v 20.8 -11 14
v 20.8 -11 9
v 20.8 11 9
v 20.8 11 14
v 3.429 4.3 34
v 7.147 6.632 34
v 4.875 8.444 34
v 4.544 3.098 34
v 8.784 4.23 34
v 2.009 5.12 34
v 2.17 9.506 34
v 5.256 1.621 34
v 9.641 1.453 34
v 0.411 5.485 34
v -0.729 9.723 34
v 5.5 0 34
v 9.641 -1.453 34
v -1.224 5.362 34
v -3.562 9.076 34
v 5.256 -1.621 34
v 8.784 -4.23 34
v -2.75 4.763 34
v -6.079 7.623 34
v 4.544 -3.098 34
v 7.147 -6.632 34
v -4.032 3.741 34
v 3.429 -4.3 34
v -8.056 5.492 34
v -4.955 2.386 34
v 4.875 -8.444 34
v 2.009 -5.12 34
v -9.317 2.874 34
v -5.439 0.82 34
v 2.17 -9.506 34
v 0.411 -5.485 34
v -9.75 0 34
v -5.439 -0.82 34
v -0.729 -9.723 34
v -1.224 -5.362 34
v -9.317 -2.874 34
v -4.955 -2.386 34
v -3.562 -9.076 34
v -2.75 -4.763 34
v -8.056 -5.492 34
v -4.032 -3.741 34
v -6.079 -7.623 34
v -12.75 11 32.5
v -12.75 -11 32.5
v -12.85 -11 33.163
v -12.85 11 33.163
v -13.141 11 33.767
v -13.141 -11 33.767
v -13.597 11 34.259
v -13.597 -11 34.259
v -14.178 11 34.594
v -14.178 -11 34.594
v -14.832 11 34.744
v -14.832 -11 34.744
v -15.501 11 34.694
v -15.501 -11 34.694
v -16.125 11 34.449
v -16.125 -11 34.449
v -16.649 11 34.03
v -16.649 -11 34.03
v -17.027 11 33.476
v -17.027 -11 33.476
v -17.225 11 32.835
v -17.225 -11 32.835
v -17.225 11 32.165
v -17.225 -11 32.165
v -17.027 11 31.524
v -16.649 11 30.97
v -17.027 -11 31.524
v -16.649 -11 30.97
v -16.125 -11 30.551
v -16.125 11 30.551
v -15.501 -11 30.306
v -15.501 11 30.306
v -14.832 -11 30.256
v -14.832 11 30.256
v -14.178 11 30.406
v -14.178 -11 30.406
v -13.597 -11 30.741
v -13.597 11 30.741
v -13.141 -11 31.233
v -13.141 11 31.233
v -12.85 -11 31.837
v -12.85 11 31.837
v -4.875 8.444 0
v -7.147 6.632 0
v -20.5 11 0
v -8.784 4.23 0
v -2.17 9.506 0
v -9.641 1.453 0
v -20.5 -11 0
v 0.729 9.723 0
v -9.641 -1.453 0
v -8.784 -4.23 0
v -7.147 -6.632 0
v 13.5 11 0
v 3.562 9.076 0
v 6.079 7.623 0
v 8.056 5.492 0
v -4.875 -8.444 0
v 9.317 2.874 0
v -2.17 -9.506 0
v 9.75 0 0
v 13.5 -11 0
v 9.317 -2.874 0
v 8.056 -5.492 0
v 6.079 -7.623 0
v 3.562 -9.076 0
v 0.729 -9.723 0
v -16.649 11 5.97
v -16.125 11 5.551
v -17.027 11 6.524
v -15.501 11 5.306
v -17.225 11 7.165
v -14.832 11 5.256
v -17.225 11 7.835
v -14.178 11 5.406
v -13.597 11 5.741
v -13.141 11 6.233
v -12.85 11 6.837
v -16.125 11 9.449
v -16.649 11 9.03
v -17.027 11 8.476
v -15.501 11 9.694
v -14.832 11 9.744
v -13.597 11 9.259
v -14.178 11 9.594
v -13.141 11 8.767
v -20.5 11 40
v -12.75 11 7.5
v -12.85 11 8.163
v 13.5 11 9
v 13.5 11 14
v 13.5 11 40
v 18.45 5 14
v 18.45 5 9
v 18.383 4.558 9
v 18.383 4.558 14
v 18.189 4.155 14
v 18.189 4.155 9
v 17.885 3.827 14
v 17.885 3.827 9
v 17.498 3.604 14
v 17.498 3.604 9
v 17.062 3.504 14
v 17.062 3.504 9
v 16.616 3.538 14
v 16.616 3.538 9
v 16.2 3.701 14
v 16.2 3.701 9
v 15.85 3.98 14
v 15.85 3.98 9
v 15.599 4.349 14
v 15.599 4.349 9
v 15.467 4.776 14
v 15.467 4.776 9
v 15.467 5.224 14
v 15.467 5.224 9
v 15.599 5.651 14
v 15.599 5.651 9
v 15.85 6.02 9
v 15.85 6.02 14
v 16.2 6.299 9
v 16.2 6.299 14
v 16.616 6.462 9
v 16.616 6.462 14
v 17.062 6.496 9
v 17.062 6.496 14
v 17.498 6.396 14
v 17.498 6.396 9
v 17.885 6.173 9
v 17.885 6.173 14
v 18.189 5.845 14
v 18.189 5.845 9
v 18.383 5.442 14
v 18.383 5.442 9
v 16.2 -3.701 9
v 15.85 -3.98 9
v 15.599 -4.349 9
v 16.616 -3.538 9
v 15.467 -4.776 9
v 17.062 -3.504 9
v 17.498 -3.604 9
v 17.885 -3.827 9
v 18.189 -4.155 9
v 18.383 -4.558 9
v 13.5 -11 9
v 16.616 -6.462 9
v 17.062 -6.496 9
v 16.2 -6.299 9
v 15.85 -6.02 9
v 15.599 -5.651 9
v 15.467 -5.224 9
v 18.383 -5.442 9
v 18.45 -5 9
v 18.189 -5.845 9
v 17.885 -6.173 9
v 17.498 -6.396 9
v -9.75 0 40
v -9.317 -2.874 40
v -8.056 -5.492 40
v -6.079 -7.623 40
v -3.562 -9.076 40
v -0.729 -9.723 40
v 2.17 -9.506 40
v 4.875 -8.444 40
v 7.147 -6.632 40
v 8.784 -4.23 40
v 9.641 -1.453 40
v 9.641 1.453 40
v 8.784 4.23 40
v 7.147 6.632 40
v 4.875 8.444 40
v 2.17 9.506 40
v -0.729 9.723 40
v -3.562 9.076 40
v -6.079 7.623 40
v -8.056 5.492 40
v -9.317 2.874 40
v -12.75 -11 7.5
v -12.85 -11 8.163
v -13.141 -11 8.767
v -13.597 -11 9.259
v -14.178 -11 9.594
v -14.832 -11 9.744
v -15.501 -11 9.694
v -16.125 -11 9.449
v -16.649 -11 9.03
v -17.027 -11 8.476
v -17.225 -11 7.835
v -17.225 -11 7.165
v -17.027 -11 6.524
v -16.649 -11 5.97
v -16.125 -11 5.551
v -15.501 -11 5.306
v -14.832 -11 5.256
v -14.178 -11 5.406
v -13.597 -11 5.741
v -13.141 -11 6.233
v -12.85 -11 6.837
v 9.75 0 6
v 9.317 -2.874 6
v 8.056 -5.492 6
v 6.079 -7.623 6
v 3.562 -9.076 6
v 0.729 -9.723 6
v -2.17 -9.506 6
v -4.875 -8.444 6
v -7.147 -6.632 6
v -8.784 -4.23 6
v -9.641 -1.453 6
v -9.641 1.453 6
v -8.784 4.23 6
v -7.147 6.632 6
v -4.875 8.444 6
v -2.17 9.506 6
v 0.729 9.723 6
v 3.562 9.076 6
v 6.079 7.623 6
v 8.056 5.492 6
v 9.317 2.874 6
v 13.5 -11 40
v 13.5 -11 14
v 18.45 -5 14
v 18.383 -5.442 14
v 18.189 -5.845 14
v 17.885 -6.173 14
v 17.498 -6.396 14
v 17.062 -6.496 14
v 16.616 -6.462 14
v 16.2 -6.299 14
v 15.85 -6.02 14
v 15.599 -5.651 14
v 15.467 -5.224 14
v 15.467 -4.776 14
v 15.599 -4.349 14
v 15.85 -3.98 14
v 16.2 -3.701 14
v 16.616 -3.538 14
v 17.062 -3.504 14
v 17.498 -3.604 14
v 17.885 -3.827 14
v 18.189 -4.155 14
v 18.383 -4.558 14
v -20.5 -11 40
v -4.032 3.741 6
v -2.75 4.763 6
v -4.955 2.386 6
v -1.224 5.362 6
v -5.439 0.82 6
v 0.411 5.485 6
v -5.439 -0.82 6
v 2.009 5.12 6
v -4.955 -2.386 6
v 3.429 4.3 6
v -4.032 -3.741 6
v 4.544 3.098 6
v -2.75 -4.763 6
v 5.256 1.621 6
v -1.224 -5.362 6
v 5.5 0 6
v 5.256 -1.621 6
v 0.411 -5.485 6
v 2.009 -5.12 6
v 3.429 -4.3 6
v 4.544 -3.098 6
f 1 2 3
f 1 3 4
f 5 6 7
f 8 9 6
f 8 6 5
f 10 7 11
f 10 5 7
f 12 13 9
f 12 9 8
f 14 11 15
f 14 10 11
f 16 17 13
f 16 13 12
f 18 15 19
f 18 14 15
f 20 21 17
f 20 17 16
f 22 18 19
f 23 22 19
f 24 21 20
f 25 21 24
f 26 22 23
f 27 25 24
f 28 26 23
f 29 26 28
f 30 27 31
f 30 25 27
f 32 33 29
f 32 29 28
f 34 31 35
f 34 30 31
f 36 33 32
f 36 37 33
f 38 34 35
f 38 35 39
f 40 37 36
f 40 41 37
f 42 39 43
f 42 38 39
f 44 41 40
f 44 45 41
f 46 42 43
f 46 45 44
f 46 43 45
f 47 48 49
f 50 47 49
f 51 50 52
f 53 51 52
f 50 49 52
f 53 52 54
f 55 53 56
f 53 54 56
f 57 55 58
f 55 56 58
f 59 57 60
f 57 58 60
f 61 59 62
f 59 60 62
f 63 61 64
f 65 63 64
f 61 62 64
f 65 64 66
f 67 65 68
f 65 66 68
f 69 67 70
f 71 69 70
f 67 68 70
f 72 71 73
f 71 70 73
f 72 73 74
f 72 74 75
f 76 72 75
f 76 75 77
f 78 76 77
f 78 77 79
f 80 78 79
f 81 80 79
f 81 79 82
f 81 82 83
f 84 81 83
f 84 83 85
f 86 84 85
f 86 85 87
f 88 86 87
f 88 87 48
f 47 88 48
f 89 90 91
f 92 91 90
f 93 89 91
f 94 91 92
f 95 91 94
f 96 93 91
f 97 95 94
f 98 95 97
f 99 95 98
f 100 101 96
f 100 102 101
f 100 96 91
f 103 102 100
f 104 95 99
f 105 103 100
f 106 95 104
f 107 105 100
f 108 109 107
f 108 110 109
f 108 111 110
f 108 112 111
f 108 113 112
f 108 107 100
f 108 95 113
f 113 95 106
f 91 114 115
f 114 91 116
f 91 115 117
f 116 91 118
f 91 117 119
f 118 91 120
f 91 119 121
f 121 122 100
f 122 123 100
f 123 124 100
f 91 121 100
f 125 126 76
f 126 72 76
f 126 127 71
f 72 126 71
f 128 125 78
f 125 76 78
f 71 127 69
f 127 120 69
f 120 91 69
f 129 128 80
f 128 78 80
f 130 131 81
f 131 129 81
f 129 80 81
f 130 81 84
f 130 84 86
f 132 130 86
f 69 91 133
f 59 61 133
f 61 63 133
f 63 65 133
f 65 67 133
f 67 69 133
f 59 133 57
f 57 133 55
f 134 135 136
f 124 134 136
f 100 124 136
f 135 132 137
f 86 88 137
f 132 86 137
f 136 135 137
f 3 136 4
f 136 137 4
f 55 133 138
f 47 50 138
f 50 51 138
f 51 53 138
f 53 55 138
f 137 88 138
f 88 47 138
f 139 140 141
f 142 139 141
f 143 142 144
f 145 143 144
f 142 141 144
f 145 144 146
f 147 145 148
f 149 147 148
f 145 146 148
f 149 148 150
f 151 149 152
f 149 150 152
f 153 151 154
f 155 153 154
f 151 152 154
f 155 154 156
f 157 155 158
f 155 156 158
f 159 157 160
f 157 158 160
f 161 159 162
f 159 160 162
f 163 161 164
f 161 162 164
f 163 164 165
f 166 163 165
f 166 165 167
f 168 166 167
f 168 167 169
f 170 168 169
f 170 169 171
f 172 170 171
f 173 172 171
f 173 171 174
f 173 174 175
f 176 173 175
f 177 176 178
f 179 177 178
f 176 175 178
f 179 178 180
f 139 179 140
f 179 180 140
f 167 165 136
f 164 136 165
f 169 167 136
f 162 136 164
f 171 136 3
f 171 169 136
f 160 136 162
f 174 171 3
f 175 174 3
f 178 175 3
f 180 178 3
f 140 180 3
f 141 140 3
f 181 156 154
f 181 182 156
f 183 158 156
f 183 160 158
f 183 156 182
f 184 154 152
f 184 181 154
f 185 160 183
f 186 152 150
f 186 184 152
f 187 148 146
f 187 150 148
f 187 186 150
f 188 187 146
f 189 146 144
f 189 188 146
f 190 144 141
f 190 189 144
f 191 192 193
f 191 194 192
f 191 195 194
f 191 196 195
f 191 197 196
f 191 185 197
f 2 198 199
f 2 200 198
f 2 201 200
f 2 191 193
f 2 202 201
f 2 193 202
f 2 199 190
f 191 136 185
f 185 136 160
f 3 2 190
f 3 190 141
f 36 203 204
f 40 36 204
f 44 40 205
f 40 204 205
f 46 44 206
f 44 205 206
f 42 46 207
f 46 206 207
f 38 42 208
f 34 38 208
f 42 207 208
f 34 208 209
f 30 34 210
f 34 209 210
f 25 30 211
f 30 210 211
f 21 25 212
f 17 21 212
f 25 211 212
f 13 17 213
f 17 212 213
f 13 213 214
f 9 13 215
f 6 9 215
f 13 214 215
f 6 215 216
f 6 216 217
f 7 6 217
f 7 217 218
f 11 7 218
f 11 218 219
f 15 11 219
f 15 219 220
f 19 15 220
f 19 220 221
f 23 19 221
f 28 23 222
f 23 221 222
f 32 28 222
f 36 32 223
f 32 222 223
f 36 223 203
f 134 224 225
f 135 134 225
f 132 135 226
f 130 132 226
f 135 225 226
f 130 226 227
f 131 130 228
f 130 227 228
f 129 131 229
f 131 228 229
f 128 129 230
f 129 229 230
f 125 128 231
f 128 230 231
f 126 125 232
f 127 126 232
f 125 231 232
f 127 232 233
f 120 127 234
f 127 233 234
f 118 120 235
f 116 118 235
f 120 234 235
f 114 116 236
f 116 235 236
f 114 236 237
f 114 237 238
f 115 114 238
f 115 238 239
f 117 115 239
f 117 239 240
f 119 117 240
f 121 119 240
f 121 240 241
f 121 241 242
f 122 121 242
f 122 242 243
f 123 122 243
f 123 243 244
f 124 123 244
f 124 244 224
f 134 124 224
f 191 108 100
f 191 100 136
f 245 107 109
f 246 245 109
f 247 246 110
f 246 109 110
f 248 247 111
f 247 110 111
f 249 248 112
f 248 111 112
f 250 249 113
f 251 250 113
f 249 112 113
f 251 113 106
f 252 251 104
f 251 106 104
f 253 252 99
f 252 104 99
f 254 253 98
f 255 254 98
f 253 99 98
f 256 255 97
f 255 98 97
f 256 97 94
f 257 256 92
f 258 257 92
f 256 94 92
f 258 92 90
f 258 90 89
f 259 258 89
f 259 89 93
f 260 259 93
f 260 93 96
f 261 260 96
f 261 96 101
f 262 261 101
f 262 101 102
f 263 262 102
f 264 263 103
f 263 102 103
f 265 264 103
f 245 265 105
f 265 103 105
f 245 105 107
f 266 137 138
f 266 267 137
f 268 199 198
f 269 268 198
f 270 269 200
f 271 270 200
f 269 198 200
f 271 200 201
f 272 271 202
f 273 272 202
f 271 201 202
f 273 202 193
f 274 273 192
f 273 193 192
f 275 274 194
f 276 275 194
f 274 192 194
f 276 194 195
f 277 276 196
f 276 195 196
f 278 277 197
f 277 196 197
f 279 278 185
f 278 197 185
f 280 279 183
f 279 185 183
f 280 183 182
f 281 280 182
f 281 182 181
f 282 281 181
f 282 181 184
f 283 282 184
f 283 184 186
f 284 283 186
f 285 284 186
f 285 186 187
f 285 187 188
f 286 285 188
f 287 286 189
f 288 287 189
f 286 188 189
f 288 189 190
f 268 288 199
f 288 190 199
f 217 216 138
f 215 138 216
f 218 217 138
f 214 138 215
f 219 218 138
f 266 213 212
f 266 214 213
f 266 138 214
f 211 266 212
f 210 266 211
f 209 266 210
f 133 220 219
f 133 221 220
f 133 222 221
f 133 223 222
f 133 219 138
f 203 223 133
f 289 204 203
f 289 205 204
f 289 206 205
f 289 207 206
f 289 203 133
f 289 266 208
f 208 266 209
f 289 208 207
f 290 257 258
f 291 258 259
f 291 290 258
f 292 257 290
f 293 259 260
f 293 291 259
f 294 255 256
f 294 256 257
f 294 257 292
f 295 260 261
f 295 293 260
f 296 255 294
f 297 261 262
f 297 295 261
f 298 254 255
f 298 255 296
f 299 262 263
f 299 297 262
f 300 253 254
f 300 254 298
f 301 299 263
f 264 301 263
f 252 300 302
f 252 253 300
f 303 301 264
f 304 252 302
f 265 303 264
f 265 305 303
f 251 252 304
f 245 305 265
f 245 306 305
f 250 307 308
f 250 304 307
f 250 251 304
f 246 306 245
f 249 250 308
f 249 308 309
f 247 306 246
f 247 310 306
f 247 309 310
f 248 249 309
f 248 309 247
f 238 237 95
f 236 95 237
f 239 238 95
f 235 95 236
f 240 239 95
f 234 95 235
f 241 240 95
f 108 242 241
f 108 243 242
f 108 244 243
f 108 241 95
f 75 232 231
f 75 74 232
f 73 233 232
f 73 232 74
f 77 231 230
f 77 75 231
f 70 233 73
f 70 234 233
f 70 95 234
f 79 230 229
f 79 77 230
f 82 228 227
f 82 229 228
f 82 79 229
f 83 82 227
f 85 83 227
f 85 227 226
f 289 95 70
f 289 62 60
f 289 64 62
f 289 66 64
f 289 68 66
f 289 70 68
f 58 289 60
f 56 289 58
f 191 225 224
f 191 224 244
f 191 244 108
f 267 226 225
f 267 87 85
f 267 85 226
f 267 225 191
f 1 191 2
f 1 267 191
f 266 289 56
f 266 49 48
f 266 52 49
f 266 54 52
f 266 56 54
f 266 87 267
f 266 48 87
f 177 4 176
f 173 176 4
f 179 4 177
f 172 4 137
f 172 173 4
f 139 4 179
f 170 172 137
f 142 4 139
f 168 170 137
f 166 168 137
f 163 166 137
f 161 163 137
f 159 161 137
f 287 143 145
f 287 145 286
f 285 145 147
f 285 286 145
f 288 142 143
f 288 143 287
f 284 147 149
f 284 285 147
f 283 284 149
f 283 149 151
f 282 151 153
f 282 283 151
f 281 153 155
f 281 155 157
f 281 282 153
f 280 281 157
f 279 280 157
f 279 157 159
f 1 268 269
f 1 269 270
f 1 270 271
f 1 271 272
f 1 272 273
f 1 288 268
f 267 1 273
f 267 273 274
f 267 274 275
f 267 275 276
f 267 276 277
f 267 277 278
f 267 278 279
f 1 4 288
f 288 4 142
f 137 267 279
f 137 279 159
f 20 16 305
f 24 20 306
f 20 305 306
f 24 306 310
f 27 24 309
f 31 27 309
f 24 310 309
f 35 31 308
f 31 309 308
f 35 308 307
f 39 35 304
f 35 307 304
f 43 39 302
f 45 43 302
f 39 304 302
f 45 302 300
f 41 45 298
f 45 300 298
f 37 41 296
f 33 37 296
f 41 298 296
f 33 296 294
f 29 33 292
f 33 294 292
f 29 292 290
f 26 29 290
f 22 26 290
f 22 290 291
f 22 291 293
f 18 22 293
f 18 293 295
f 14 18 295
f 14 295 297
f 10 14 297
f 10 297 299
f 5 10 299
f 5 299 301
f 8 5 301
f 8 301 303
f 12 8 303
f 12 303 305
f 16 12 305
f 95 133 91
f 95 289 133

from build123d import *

# Parameters (mm, degrees)
PAD_DEPTH       = 11
SKETCH001_R     = 9.75
POCKET_DEPTH    = 6
SKETCH002_R     = 5.5
POCKET001_DEPTH = 40
SKETCH003_R     = 9.75
POCKET002_DEPTH = 6
SKETCH004_R     = 2.25
POCKET003_DEPTH = 25
SKETCH005_R     = 1.5
POCKET004_DEPTH = 5


with BuildPart() as part:
    # Sketch → Pad (new body, symmetric)
    with BuildSketch(Plane.XZ):
        Polygon((-20.5, 40), (-20.5, 0), (13.5, 0), (13.5, 9), (20.8, 9), (20.8, 14), (13.5, 14), (13.5, 40), align=None)
    extrude(amount=PAD_DEPTH, both=True)

    # Sketch001 (on Face2 of Pad) → Pocket (cut)
    with BuildSketch(Plane(origin=(0, 0, 0), x_dir=(1, 0, 0), z_dir=(0, 0, -1))):
        Circle(SKETCH001_R)
    extrude(amount=-POCKET_DEPTH, mode=Mode.SUBTRACT)

    # Sketch002 (on Face12 of Pocket) → Pocket001 (cut)
    with BuildSketch(Plane(origin=(0, 0, 6), x_dir=(1, 0, 0), z_dir=(0, 0, -1))):
        Circle(SKETCH002_R)
    extrude(amount=-POCKET001_DEPTH, mode=Mode.SUBTRACT)

    # Sketch003 (on Face2 of Pocket001) → Pocket002 (cut)
    with BuildSketch(Plane(origin=(0, 0, 40), x_dir=(-1, 0, 0), z_dir=(0, 0, 1))):
        Circle(SKETCH003_R)
    extrude(amount=-POCKET002_DEPTH, mode=Mode.SUBTRACT)

    # Sketch004 (on Face5 of Pocket002) → Pocket003 (cut)
    with BuildSketch(Plane.XZ.offset(11)):
        with Locations((-15, 32.5)):
            Circle(SKETCH004_R)
        with Locations((-15, 7.5)):
            Circle(SKETCH004_R)
    extrude(amount=-POCKET003_DEPTH, mode=Mode.SUBTRACT)

    # Sketch005 (on Face11 of Pocket003) → Pocket004 (cut)
    with BuildSketch(Plane(origin=(0, 0, 9), x_dir=(1, 0, 0), z_dir=(0, 0, -1))):
        with Locations((16.95, 5)):
            Circle(SKETCH005_R)
        with Locations((16.95, -5)):
            Circle(SKETCH005_R)
    extrude(amount=-POCKET004_DEPTH, mode=Mode.SUBTRACT)


solid = part.part
